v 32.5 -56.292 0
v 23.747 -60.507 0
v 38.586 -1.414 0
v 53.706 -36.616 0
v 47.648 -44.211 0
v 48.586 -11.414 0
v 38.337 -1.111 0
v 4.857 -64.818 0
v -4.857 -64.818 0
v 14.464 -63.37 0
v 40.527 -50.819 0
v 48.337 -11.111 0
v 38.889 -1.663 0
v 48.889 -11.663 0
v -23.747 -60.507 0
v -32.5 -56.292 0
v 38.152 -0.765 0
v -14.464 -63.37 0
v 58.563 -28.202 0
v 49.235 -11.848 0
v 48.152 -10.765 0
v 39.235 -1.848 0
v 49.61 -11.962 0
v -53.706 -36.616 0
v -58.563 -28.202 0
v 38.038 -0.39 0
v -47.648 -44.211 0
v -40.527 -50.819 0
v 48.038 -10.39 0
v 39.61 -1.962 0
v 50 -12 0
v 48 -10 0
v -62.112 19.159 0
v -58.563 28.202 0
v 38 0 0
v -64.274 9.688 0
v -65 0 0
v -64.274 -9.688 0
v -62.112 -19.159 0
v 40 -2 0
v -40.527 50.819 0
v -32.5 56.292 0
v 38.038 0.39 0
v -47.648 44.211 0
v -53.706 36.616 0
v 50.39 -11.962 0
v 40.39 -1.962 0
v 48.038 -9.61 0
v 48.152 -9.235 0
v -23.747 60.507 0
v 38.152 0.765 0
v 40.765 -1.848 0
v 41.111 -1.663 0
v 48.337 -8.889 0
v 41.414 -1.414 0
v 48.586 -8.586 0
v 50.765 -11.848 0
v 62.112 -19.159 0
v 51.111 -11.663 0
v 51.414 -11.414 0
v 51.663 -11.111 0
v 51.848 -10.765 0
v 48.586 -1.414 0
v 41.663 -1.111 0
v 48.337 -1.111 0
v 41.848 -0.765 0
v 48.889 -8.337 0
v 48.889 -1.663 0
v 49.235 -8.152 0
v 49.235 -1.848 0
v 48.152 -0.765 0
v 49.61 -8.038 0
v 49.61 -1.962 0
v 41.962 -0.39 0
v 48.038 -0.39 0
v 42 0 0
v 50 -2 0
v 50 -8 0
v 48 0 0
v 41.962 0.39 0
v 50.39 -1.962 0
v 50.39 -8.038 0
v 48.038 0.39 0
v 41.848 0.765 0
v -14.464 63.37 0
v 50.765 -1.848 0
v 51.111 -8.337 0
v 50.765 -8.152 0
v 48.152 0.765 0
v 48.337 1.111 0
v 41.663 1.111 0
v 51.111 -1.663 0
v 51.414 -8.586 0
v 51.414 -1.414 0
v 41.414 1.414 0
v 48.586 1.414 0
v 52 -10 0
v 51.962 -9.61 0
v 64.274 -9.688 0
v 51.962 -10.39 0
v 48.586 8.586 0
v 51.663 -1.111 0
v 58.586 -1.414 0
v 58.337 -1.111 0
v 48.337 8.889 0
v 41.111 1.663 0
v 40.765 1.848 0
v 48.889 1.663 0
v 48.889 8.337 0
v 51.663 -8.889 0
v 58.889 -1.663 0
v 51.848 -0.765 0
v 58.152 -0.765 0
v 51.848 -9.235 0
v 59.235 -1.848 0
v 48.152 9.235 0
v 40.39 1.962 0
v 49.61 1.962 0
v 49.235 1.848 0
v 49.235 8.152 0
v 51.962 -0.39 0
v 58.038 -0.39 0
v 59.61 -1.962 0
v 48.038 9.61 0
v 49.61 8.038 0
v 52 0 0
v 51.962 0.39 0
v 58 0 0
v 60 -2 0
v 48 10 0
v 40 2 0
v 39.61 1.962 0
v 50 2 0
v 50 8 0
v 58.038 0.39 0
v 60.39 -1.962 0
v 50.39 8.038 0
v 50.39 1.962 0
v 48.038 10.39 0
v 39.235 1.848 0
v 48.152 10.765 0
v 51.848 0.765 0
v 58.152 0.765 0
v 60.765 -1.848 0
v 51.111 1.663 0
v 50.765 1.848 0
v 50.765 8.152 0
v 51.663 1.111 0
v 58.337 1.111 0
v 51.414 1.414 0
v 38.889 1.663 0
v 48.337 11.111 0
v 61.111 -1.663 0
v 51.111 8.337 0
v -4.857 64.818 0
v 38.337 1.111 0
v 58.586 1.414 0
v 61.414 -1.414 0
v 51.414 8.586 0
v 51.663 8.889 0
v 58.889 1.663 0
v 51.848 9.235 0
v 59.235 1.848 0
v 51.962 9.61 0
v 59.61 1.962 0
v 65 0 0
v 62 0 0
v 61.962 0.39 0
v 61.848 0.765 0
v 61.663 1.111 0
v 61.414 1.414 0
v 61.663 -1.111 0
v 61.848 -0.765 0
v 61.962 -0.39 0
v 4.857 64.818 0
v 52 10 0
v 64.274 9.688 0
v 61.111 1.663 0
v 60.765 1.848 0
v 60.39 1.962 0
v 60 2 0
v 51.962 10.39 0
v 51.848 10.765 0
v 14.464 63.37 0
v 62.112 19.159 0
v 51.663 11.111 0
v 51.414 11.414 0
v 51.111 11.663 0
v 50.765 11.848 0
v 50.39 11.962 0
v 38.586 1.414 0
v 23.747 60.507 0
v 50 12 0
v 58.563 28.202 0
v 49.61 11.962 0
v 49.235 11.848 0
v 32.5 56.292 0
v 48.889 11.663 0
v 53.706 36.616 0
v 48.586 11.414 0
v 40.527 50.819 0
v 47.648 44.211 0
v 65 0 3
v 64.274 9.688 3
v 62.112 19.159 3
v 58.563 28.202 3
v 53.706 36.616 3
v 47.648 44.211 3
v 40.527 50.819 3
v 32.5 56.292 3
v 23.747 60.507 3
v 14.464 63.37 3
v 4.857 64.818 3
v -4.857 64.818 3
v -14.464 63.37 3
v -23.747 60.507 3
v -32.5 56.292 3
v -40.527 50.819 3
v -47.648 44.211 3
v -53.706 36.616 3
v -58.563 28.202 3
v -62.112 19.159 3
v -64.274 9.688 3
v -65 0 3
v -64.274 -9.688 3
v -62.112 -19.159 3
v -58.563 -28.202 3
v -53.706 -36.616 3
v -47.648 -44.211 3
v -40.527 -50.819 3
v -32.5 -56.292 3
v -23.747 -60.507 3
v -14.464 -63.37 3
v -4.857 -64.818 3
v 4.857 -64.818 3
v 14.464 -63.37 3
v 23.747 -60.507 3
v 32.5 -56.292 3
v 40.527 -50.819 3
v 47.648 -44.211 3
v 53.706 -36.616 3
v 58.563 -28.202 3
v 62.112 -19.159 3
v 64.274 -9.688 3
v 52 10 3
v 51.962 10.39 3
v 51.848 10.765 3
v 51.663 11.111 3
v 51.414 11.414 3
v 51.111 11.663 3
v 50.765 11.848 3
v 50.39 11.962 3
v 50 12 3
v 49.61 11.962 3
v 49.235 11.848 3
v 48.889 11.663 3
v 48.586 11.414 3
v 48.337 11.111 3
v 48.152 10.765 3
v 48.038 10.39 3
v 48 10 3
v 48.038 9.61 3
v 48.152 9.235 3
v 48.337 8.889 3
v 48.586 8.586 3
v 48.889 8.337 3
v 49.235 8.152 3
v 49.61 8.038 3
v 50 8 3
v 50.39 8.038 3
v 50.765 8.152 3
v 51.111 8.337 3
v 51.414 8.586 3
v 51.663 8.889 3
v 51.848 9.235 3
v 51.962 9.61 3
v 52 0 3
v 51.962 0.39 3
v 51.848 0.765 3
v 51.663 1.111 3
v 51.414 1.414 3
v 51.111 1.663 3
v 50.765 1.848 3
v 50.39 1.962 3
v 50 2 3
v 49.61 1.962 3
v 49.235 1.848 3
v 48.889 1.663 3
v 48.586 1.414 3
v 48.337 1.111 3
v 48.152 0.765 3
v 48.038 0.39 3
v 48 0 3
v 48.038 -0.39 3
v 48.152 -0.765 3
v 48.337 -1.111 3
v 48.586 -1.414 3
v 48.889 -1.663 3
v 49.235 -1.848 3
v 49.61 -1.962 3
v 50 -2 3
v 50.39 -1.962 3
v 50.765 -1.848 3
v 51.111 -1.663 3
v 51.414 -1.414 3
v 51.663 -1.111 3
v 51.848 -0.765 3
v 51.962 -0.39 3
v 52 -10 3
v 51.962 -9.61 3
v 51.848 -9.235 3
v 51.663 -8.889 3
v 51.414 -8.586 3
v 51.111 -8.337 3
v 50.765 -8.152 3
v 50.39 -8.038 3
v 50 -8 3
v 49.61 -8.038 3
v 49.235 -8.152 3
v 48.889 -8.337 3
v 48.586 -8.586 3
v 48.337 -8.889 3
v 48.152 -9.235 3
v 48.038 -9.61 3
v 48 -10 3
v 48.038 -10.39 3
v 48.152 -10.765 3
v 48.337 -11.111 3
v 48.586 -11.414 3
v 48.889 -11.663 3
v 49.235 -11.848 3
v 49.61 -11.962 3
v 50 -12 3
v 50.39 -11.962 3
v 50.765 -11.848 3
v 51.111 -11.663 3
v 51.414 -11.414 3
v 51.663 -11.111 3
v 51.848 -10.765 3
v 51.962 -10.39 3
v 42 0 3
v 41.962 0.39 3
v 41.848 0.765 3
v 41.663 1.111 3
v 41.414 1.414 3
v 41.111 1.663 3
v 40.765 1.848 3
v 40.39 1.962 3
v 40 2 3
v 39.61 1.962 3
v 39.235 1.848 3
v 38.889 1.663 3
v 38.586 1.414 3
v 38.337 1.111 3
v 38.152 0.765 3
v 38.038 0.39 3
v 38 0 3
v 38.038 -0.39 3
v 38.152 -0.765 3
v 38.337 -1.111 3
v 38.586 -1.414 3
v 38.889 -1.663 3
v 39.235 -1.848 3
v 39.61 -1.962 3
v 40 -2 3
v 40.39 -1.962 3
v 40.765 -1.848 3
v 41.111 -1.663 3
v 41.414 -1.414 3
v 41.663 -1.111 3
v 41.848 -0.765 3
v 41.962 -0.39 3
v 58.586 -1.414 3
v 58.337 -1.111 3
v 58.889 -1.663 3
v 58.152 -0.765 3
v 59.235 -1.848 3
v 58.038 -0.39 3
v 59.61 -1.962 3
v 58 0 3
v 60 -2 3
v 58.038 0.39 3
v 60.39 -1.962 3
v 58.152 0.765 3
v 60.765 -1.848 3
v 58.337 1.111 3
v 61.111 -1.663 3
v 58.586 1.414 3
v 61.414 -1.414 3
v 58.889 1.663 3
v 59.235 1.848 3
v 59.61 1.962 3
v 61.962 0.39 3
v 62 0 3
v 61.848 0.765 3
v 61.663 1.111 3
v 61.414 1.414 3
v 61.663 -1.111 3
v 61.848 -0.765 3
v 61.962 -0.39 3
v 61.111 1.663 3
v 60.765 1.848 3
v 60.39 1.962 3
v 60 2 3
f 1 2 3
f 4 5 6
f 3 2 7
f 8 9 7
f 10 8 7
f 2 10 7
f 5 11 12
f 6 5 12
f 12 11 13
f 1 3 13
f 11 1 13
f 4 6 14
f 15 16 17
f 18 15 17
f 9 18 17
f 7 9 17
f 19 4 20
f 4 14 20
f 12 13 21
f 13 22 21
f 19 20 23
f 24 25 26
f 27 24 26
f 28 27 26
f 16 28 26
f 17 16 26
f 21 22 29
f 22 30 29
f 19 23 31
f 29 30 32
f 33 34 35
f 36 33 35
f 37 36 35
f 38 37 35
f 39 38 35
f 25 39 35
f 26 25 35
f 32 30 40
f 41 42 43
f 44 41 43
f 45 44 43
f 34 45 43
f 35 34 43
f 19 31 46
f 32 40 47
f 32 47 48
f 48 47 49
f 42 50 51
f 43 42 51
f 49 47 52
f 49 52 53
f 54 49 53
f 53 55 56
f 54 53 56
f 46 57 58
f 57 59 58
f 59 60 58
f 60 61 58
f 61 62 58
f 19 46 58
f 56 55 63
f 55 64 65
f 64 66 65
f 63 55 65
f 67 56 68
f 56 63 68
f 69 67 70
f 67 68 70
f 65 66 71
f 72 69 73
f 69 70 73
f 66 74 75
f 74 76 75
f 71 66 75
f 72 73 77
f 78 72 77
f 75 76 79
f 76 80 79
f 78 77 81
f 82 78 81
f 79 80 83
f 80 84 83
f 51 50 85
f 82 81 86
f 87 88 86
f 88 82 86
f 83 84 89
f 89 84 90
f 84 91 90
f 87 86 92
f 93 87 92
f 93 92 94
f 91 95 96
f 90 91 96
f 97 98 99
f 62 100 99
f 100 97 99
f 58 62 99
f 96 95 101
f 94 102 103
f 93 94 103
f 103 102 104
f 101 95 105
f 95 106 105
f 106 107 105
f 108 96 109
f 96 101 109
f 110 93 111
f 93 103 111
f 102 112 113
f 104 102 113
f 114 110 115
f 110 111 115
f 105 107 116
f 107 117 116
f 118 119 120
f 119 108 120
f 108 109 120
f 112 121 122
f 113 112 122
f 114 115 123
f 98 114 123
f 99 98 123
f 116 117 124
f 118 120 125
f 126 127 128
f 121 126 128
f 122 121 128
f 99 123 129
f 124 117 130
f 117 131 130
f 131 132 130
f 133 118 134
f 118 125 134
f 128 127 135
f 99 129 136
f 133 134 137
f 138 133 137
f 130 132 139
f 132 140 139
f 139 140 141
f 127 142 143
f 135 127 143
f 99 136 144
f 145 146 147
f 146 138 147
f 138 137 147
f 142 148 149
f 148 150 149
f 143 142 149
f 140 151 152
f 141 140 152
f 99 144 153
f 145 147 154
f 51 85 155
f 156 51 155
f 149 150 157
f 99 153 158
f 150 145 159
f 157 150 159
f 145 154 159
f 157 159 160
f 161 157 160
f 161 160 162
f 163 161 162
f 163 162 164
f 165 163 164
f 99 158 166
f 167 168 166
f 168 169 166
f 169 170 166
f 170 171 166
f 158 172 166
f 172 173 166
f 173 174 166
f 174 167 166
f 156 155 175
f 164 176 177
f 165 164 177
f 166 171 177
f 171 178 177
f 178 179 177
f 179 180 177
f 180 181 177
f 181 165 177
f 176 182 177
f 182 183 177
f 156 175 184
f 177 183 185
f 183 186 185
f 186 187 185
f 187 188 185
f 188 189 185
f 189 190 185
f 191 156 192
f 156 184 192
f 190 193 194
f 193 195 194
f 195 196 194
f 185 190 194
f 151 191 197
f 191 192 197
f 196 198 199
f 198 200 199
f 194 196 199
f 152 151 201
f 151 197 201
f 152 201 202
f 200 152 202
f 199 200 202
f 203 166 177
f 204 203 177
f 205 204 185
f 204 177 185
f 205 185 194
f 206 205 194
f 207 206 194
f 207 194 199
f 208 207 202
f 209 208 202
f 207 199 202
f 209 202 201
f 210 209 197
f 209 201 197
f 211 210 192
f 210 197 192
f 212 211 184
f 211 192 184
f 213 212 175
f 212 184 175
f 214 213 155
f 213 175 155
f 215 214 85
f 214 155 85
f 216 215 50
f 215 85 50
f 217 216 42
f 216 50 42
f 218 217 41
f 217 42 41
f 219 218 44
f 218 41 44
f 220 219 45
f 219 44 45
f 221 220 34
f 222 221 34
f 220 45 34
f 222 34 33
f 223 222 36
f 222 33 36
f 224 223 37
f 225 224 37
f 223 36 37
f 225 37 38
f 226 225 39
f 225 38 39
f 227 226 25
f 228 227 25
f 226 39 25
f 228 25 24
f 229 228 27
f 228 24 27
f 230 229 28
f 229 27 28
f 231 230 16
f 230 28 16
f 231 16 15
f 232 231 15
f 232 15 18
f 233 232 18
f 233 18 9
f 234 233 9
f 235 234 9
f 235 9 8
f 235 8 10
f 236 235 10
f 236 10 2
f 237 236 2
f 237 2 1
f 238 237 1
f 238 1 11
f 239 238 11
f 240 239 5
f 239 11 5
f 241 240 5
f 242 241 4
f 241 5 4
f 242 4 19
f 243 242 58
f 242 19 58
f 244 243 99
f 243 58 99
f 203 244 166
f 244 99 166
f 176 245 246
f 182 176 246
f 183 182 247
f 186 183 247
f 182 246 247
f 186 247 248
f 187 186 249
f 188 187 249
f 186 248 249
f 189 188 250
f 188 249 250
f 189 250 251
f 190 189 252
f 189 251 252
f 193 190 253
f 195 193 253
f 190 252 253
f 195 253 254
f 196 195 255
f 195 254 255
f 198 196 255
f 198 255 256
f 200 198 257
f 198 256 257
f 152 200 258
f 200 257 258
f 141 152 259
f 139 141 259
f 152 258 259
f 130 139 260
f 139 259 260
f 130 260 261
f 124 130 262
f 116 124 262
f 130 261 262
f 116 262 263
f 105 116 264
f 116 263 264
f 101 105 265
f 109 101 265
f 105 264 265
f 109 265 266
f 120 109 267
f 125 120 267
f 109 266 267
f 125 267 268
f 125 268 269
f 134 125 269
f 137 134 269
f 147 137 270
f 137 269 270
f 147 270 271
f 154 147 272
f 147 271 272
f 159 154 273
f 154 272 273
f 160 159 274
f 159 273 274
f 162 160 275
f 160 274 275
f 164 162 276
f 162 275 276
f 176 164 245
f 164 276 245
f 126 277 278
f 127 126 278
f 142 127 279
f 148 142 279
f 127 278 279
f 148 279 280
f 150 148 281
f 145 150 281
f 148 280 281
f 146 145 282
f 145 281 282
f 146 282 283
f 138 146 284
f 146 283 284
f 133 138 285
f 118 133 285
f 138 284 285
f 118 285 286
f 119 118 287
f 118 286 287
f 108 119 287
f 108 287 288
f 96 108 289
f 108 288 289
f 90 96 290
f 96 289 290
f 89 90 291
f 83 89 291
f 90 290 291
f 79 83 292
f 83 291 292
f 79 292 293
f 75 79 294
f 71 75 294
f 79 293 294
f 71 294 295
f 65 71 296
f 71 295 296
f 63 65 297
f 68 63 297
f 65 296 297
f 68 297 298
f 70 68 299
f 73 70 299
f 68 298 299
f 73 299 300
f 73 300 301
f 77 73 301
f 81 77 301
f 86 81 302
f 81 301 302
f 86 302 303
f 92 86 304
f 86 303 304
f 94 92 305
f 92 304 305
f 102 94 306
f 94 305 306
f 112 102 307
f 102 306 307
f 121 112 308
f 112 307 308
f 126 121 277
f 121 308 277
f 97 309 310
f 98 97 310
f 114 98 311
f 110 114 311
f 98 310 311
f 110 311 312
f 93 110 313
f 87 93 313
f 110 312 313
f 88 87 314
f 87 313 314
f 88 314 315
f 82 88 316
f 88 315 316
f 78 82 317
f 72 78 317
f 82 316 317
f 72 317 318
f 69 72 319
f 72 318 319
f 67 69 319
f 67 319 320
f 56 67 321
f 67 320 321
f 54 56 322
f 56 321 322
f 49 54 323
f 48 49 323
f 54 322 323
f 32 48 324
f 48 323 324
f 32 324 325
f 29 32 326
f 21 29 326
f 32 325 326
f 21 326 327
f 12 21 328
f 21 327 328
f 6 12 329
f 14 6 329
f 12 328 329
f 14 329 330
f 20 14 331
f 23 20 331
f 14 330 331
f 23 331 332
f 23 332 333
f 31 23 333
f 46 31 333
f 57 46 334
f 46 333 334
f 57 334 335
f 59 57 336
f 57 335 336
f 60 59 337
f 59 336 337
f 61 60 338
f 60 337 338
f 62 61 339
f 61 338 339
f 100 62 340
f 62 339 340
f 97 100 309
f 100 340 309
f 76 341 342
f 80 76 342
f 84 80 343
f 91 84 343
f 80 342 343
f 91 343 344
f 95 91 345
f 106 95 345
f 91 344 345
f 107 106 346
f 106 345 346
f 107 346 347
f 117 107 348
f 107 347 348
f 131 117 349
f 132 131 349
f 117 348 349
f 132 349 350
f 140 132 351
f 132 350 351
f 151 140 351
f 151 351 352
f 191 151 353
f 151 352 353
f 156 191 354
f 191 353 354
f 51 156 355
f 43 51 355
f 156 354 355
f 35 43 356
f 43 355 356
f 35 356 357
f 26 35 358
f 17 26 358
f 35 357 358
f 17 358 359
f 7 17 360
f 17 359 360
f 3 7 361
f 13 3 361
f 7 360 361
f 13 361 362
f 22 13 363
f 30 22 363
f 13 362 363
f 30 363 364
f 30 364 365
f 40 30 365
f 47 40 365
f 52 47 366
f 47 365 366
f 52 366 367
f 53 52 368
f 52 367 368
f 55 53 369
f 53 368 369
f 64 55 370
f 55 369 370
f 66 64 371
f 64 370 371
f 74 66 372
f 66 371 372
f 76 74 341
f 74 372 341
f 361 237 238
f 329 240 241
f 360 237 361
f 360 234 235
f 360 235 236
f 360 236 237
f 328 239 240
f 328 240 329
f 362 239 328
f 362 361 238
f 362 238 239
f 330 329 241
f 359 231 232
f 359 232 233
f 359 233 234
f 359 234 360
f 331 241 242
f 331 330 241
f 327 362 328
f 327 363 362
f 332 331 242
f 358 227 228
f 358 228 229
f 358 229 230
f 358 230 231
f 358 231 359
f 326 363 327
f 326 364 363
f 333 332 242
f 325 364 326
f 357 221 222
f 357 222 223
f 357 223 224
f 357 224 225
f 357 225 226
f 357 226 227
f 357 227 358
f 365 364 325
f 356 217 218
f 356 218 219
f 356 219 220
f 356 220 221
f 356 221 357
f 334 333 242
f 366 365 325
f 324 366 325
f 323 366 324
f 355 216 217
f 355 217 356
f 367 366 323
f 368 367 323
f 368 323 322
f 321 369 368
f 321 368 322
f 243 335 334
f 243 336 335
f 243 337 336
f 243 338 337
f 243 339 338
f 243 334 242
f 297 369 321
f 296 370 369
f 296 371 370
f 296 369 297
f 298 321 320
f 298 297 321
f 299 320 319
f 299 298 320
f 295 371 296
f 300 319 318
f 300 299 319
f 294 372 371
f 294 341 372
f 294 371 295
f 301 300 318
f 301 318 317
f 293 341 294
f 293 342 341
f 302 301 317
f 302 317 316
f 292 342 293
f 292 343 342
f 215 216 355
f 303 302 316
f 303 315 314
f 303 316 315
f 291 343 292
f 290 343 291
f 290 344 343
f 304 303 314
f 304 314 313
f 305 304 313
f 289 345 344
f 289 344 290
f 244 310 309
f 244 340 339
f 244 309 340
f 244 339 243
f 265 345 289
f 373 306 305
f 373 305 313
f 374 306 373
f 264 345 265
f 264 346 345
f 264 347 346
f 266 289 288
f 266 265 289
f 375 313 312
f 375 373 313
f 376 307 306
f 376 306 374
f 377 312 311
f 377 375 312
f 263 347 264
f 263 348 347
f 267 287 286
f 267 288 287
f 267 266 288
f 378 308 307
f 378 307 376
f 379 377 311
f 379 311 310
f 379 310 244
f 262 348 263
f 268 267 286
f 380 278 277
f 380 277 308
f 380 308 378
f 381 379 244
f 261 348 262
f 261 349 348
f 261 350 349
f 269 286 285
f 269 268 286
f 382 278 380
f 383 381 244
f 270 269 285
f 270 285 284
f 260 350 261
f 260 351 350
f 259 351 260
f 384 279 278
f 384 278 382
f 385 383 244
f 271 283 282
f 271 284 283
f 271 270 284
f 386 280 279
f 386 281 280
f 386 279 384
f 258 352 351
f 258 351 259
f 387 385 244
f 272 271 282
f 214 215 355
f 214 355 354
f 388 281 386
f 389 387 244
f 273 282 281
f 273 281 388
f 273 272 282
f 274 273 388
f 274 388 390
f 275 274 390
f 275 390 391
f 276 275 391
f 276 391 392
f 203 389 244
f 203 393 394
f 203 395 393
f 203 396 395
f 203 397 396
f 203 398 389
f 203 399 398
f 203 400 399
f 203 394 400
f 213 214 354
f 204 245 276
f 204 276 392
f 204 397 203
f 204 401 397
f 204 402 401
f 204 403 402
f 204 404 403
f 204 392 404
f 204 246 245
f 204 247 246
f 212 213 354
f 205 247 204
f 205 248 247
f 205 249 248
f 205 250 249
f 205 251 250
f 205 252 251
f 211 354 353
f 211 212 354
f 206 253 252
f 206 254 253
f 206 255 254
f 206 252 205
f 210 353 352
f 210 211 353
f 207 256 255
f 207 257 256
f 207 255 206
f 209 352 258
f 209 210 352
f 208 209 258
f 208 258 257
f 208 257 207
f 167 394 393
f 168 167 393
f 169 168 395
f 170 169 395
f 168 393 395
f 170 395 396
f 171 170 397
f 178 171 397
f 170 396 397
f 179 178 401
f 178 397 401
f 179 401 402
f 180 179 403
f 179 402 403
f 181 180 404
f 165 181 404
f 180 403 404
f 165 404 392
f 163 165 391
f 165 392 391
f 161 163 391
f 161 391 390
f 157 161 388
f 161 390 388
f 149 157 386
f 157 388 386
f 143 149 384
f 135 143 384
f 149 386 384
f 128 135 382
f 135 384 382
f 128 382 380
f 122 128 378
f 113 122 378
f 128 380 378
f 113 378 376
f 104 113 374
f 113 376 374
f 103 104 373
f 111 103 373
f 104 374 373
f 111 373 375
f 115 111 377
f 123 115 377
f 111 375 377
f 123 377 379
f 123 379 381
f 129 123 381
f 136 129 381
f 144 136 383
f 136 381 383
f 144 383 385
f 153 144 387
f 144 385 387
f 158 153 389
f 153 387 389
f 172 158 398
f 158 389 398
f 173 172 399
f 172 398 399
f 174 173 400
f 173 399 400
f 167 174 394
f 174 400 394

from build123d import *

# Parameters (mm, degrees)
SKETCH_1_R          = 65
EXTRUDE_1_DEPTH     = 3
SKETCH_2_R          = 2
SKETCH_2_R_2        = 1.5
CUT_EXTRUDE_4_DEPTH = 3


with BuildPart() as part:
    # 草图1 → 凸台-拉伸1 (new body)
    with BuildSketch(Plane.XY):
        Circle(SKETCH_1_R)
    extrude(amount=EXTRUDE_1_DEPTH)

    # 草图2 → 切除-拉伸4 (cut)
    with BuildSketch(Plane.XY.offset(3)):
        with Locations((40, 0)):
            Circle(SKETCH_2_R)
        with Locations((50, -10)):
            Circle(SKETCH_2_R)
        with Locations((50, 0)):
            Circle(SKETCH_2_R_2)
        with Locations((50, 0)):
            Circle(SKETCH_2_R)
        with Locations((50, 10)):
            Circle(SKETCH_2_R)
        with Locations((60, 0)):
            Circle(SKETCH_2_R)
    extrude(amount=-CUT_EXTRUDE_4_DEPTH, mode=Mode.SUBTRACT)


solid = part.part
